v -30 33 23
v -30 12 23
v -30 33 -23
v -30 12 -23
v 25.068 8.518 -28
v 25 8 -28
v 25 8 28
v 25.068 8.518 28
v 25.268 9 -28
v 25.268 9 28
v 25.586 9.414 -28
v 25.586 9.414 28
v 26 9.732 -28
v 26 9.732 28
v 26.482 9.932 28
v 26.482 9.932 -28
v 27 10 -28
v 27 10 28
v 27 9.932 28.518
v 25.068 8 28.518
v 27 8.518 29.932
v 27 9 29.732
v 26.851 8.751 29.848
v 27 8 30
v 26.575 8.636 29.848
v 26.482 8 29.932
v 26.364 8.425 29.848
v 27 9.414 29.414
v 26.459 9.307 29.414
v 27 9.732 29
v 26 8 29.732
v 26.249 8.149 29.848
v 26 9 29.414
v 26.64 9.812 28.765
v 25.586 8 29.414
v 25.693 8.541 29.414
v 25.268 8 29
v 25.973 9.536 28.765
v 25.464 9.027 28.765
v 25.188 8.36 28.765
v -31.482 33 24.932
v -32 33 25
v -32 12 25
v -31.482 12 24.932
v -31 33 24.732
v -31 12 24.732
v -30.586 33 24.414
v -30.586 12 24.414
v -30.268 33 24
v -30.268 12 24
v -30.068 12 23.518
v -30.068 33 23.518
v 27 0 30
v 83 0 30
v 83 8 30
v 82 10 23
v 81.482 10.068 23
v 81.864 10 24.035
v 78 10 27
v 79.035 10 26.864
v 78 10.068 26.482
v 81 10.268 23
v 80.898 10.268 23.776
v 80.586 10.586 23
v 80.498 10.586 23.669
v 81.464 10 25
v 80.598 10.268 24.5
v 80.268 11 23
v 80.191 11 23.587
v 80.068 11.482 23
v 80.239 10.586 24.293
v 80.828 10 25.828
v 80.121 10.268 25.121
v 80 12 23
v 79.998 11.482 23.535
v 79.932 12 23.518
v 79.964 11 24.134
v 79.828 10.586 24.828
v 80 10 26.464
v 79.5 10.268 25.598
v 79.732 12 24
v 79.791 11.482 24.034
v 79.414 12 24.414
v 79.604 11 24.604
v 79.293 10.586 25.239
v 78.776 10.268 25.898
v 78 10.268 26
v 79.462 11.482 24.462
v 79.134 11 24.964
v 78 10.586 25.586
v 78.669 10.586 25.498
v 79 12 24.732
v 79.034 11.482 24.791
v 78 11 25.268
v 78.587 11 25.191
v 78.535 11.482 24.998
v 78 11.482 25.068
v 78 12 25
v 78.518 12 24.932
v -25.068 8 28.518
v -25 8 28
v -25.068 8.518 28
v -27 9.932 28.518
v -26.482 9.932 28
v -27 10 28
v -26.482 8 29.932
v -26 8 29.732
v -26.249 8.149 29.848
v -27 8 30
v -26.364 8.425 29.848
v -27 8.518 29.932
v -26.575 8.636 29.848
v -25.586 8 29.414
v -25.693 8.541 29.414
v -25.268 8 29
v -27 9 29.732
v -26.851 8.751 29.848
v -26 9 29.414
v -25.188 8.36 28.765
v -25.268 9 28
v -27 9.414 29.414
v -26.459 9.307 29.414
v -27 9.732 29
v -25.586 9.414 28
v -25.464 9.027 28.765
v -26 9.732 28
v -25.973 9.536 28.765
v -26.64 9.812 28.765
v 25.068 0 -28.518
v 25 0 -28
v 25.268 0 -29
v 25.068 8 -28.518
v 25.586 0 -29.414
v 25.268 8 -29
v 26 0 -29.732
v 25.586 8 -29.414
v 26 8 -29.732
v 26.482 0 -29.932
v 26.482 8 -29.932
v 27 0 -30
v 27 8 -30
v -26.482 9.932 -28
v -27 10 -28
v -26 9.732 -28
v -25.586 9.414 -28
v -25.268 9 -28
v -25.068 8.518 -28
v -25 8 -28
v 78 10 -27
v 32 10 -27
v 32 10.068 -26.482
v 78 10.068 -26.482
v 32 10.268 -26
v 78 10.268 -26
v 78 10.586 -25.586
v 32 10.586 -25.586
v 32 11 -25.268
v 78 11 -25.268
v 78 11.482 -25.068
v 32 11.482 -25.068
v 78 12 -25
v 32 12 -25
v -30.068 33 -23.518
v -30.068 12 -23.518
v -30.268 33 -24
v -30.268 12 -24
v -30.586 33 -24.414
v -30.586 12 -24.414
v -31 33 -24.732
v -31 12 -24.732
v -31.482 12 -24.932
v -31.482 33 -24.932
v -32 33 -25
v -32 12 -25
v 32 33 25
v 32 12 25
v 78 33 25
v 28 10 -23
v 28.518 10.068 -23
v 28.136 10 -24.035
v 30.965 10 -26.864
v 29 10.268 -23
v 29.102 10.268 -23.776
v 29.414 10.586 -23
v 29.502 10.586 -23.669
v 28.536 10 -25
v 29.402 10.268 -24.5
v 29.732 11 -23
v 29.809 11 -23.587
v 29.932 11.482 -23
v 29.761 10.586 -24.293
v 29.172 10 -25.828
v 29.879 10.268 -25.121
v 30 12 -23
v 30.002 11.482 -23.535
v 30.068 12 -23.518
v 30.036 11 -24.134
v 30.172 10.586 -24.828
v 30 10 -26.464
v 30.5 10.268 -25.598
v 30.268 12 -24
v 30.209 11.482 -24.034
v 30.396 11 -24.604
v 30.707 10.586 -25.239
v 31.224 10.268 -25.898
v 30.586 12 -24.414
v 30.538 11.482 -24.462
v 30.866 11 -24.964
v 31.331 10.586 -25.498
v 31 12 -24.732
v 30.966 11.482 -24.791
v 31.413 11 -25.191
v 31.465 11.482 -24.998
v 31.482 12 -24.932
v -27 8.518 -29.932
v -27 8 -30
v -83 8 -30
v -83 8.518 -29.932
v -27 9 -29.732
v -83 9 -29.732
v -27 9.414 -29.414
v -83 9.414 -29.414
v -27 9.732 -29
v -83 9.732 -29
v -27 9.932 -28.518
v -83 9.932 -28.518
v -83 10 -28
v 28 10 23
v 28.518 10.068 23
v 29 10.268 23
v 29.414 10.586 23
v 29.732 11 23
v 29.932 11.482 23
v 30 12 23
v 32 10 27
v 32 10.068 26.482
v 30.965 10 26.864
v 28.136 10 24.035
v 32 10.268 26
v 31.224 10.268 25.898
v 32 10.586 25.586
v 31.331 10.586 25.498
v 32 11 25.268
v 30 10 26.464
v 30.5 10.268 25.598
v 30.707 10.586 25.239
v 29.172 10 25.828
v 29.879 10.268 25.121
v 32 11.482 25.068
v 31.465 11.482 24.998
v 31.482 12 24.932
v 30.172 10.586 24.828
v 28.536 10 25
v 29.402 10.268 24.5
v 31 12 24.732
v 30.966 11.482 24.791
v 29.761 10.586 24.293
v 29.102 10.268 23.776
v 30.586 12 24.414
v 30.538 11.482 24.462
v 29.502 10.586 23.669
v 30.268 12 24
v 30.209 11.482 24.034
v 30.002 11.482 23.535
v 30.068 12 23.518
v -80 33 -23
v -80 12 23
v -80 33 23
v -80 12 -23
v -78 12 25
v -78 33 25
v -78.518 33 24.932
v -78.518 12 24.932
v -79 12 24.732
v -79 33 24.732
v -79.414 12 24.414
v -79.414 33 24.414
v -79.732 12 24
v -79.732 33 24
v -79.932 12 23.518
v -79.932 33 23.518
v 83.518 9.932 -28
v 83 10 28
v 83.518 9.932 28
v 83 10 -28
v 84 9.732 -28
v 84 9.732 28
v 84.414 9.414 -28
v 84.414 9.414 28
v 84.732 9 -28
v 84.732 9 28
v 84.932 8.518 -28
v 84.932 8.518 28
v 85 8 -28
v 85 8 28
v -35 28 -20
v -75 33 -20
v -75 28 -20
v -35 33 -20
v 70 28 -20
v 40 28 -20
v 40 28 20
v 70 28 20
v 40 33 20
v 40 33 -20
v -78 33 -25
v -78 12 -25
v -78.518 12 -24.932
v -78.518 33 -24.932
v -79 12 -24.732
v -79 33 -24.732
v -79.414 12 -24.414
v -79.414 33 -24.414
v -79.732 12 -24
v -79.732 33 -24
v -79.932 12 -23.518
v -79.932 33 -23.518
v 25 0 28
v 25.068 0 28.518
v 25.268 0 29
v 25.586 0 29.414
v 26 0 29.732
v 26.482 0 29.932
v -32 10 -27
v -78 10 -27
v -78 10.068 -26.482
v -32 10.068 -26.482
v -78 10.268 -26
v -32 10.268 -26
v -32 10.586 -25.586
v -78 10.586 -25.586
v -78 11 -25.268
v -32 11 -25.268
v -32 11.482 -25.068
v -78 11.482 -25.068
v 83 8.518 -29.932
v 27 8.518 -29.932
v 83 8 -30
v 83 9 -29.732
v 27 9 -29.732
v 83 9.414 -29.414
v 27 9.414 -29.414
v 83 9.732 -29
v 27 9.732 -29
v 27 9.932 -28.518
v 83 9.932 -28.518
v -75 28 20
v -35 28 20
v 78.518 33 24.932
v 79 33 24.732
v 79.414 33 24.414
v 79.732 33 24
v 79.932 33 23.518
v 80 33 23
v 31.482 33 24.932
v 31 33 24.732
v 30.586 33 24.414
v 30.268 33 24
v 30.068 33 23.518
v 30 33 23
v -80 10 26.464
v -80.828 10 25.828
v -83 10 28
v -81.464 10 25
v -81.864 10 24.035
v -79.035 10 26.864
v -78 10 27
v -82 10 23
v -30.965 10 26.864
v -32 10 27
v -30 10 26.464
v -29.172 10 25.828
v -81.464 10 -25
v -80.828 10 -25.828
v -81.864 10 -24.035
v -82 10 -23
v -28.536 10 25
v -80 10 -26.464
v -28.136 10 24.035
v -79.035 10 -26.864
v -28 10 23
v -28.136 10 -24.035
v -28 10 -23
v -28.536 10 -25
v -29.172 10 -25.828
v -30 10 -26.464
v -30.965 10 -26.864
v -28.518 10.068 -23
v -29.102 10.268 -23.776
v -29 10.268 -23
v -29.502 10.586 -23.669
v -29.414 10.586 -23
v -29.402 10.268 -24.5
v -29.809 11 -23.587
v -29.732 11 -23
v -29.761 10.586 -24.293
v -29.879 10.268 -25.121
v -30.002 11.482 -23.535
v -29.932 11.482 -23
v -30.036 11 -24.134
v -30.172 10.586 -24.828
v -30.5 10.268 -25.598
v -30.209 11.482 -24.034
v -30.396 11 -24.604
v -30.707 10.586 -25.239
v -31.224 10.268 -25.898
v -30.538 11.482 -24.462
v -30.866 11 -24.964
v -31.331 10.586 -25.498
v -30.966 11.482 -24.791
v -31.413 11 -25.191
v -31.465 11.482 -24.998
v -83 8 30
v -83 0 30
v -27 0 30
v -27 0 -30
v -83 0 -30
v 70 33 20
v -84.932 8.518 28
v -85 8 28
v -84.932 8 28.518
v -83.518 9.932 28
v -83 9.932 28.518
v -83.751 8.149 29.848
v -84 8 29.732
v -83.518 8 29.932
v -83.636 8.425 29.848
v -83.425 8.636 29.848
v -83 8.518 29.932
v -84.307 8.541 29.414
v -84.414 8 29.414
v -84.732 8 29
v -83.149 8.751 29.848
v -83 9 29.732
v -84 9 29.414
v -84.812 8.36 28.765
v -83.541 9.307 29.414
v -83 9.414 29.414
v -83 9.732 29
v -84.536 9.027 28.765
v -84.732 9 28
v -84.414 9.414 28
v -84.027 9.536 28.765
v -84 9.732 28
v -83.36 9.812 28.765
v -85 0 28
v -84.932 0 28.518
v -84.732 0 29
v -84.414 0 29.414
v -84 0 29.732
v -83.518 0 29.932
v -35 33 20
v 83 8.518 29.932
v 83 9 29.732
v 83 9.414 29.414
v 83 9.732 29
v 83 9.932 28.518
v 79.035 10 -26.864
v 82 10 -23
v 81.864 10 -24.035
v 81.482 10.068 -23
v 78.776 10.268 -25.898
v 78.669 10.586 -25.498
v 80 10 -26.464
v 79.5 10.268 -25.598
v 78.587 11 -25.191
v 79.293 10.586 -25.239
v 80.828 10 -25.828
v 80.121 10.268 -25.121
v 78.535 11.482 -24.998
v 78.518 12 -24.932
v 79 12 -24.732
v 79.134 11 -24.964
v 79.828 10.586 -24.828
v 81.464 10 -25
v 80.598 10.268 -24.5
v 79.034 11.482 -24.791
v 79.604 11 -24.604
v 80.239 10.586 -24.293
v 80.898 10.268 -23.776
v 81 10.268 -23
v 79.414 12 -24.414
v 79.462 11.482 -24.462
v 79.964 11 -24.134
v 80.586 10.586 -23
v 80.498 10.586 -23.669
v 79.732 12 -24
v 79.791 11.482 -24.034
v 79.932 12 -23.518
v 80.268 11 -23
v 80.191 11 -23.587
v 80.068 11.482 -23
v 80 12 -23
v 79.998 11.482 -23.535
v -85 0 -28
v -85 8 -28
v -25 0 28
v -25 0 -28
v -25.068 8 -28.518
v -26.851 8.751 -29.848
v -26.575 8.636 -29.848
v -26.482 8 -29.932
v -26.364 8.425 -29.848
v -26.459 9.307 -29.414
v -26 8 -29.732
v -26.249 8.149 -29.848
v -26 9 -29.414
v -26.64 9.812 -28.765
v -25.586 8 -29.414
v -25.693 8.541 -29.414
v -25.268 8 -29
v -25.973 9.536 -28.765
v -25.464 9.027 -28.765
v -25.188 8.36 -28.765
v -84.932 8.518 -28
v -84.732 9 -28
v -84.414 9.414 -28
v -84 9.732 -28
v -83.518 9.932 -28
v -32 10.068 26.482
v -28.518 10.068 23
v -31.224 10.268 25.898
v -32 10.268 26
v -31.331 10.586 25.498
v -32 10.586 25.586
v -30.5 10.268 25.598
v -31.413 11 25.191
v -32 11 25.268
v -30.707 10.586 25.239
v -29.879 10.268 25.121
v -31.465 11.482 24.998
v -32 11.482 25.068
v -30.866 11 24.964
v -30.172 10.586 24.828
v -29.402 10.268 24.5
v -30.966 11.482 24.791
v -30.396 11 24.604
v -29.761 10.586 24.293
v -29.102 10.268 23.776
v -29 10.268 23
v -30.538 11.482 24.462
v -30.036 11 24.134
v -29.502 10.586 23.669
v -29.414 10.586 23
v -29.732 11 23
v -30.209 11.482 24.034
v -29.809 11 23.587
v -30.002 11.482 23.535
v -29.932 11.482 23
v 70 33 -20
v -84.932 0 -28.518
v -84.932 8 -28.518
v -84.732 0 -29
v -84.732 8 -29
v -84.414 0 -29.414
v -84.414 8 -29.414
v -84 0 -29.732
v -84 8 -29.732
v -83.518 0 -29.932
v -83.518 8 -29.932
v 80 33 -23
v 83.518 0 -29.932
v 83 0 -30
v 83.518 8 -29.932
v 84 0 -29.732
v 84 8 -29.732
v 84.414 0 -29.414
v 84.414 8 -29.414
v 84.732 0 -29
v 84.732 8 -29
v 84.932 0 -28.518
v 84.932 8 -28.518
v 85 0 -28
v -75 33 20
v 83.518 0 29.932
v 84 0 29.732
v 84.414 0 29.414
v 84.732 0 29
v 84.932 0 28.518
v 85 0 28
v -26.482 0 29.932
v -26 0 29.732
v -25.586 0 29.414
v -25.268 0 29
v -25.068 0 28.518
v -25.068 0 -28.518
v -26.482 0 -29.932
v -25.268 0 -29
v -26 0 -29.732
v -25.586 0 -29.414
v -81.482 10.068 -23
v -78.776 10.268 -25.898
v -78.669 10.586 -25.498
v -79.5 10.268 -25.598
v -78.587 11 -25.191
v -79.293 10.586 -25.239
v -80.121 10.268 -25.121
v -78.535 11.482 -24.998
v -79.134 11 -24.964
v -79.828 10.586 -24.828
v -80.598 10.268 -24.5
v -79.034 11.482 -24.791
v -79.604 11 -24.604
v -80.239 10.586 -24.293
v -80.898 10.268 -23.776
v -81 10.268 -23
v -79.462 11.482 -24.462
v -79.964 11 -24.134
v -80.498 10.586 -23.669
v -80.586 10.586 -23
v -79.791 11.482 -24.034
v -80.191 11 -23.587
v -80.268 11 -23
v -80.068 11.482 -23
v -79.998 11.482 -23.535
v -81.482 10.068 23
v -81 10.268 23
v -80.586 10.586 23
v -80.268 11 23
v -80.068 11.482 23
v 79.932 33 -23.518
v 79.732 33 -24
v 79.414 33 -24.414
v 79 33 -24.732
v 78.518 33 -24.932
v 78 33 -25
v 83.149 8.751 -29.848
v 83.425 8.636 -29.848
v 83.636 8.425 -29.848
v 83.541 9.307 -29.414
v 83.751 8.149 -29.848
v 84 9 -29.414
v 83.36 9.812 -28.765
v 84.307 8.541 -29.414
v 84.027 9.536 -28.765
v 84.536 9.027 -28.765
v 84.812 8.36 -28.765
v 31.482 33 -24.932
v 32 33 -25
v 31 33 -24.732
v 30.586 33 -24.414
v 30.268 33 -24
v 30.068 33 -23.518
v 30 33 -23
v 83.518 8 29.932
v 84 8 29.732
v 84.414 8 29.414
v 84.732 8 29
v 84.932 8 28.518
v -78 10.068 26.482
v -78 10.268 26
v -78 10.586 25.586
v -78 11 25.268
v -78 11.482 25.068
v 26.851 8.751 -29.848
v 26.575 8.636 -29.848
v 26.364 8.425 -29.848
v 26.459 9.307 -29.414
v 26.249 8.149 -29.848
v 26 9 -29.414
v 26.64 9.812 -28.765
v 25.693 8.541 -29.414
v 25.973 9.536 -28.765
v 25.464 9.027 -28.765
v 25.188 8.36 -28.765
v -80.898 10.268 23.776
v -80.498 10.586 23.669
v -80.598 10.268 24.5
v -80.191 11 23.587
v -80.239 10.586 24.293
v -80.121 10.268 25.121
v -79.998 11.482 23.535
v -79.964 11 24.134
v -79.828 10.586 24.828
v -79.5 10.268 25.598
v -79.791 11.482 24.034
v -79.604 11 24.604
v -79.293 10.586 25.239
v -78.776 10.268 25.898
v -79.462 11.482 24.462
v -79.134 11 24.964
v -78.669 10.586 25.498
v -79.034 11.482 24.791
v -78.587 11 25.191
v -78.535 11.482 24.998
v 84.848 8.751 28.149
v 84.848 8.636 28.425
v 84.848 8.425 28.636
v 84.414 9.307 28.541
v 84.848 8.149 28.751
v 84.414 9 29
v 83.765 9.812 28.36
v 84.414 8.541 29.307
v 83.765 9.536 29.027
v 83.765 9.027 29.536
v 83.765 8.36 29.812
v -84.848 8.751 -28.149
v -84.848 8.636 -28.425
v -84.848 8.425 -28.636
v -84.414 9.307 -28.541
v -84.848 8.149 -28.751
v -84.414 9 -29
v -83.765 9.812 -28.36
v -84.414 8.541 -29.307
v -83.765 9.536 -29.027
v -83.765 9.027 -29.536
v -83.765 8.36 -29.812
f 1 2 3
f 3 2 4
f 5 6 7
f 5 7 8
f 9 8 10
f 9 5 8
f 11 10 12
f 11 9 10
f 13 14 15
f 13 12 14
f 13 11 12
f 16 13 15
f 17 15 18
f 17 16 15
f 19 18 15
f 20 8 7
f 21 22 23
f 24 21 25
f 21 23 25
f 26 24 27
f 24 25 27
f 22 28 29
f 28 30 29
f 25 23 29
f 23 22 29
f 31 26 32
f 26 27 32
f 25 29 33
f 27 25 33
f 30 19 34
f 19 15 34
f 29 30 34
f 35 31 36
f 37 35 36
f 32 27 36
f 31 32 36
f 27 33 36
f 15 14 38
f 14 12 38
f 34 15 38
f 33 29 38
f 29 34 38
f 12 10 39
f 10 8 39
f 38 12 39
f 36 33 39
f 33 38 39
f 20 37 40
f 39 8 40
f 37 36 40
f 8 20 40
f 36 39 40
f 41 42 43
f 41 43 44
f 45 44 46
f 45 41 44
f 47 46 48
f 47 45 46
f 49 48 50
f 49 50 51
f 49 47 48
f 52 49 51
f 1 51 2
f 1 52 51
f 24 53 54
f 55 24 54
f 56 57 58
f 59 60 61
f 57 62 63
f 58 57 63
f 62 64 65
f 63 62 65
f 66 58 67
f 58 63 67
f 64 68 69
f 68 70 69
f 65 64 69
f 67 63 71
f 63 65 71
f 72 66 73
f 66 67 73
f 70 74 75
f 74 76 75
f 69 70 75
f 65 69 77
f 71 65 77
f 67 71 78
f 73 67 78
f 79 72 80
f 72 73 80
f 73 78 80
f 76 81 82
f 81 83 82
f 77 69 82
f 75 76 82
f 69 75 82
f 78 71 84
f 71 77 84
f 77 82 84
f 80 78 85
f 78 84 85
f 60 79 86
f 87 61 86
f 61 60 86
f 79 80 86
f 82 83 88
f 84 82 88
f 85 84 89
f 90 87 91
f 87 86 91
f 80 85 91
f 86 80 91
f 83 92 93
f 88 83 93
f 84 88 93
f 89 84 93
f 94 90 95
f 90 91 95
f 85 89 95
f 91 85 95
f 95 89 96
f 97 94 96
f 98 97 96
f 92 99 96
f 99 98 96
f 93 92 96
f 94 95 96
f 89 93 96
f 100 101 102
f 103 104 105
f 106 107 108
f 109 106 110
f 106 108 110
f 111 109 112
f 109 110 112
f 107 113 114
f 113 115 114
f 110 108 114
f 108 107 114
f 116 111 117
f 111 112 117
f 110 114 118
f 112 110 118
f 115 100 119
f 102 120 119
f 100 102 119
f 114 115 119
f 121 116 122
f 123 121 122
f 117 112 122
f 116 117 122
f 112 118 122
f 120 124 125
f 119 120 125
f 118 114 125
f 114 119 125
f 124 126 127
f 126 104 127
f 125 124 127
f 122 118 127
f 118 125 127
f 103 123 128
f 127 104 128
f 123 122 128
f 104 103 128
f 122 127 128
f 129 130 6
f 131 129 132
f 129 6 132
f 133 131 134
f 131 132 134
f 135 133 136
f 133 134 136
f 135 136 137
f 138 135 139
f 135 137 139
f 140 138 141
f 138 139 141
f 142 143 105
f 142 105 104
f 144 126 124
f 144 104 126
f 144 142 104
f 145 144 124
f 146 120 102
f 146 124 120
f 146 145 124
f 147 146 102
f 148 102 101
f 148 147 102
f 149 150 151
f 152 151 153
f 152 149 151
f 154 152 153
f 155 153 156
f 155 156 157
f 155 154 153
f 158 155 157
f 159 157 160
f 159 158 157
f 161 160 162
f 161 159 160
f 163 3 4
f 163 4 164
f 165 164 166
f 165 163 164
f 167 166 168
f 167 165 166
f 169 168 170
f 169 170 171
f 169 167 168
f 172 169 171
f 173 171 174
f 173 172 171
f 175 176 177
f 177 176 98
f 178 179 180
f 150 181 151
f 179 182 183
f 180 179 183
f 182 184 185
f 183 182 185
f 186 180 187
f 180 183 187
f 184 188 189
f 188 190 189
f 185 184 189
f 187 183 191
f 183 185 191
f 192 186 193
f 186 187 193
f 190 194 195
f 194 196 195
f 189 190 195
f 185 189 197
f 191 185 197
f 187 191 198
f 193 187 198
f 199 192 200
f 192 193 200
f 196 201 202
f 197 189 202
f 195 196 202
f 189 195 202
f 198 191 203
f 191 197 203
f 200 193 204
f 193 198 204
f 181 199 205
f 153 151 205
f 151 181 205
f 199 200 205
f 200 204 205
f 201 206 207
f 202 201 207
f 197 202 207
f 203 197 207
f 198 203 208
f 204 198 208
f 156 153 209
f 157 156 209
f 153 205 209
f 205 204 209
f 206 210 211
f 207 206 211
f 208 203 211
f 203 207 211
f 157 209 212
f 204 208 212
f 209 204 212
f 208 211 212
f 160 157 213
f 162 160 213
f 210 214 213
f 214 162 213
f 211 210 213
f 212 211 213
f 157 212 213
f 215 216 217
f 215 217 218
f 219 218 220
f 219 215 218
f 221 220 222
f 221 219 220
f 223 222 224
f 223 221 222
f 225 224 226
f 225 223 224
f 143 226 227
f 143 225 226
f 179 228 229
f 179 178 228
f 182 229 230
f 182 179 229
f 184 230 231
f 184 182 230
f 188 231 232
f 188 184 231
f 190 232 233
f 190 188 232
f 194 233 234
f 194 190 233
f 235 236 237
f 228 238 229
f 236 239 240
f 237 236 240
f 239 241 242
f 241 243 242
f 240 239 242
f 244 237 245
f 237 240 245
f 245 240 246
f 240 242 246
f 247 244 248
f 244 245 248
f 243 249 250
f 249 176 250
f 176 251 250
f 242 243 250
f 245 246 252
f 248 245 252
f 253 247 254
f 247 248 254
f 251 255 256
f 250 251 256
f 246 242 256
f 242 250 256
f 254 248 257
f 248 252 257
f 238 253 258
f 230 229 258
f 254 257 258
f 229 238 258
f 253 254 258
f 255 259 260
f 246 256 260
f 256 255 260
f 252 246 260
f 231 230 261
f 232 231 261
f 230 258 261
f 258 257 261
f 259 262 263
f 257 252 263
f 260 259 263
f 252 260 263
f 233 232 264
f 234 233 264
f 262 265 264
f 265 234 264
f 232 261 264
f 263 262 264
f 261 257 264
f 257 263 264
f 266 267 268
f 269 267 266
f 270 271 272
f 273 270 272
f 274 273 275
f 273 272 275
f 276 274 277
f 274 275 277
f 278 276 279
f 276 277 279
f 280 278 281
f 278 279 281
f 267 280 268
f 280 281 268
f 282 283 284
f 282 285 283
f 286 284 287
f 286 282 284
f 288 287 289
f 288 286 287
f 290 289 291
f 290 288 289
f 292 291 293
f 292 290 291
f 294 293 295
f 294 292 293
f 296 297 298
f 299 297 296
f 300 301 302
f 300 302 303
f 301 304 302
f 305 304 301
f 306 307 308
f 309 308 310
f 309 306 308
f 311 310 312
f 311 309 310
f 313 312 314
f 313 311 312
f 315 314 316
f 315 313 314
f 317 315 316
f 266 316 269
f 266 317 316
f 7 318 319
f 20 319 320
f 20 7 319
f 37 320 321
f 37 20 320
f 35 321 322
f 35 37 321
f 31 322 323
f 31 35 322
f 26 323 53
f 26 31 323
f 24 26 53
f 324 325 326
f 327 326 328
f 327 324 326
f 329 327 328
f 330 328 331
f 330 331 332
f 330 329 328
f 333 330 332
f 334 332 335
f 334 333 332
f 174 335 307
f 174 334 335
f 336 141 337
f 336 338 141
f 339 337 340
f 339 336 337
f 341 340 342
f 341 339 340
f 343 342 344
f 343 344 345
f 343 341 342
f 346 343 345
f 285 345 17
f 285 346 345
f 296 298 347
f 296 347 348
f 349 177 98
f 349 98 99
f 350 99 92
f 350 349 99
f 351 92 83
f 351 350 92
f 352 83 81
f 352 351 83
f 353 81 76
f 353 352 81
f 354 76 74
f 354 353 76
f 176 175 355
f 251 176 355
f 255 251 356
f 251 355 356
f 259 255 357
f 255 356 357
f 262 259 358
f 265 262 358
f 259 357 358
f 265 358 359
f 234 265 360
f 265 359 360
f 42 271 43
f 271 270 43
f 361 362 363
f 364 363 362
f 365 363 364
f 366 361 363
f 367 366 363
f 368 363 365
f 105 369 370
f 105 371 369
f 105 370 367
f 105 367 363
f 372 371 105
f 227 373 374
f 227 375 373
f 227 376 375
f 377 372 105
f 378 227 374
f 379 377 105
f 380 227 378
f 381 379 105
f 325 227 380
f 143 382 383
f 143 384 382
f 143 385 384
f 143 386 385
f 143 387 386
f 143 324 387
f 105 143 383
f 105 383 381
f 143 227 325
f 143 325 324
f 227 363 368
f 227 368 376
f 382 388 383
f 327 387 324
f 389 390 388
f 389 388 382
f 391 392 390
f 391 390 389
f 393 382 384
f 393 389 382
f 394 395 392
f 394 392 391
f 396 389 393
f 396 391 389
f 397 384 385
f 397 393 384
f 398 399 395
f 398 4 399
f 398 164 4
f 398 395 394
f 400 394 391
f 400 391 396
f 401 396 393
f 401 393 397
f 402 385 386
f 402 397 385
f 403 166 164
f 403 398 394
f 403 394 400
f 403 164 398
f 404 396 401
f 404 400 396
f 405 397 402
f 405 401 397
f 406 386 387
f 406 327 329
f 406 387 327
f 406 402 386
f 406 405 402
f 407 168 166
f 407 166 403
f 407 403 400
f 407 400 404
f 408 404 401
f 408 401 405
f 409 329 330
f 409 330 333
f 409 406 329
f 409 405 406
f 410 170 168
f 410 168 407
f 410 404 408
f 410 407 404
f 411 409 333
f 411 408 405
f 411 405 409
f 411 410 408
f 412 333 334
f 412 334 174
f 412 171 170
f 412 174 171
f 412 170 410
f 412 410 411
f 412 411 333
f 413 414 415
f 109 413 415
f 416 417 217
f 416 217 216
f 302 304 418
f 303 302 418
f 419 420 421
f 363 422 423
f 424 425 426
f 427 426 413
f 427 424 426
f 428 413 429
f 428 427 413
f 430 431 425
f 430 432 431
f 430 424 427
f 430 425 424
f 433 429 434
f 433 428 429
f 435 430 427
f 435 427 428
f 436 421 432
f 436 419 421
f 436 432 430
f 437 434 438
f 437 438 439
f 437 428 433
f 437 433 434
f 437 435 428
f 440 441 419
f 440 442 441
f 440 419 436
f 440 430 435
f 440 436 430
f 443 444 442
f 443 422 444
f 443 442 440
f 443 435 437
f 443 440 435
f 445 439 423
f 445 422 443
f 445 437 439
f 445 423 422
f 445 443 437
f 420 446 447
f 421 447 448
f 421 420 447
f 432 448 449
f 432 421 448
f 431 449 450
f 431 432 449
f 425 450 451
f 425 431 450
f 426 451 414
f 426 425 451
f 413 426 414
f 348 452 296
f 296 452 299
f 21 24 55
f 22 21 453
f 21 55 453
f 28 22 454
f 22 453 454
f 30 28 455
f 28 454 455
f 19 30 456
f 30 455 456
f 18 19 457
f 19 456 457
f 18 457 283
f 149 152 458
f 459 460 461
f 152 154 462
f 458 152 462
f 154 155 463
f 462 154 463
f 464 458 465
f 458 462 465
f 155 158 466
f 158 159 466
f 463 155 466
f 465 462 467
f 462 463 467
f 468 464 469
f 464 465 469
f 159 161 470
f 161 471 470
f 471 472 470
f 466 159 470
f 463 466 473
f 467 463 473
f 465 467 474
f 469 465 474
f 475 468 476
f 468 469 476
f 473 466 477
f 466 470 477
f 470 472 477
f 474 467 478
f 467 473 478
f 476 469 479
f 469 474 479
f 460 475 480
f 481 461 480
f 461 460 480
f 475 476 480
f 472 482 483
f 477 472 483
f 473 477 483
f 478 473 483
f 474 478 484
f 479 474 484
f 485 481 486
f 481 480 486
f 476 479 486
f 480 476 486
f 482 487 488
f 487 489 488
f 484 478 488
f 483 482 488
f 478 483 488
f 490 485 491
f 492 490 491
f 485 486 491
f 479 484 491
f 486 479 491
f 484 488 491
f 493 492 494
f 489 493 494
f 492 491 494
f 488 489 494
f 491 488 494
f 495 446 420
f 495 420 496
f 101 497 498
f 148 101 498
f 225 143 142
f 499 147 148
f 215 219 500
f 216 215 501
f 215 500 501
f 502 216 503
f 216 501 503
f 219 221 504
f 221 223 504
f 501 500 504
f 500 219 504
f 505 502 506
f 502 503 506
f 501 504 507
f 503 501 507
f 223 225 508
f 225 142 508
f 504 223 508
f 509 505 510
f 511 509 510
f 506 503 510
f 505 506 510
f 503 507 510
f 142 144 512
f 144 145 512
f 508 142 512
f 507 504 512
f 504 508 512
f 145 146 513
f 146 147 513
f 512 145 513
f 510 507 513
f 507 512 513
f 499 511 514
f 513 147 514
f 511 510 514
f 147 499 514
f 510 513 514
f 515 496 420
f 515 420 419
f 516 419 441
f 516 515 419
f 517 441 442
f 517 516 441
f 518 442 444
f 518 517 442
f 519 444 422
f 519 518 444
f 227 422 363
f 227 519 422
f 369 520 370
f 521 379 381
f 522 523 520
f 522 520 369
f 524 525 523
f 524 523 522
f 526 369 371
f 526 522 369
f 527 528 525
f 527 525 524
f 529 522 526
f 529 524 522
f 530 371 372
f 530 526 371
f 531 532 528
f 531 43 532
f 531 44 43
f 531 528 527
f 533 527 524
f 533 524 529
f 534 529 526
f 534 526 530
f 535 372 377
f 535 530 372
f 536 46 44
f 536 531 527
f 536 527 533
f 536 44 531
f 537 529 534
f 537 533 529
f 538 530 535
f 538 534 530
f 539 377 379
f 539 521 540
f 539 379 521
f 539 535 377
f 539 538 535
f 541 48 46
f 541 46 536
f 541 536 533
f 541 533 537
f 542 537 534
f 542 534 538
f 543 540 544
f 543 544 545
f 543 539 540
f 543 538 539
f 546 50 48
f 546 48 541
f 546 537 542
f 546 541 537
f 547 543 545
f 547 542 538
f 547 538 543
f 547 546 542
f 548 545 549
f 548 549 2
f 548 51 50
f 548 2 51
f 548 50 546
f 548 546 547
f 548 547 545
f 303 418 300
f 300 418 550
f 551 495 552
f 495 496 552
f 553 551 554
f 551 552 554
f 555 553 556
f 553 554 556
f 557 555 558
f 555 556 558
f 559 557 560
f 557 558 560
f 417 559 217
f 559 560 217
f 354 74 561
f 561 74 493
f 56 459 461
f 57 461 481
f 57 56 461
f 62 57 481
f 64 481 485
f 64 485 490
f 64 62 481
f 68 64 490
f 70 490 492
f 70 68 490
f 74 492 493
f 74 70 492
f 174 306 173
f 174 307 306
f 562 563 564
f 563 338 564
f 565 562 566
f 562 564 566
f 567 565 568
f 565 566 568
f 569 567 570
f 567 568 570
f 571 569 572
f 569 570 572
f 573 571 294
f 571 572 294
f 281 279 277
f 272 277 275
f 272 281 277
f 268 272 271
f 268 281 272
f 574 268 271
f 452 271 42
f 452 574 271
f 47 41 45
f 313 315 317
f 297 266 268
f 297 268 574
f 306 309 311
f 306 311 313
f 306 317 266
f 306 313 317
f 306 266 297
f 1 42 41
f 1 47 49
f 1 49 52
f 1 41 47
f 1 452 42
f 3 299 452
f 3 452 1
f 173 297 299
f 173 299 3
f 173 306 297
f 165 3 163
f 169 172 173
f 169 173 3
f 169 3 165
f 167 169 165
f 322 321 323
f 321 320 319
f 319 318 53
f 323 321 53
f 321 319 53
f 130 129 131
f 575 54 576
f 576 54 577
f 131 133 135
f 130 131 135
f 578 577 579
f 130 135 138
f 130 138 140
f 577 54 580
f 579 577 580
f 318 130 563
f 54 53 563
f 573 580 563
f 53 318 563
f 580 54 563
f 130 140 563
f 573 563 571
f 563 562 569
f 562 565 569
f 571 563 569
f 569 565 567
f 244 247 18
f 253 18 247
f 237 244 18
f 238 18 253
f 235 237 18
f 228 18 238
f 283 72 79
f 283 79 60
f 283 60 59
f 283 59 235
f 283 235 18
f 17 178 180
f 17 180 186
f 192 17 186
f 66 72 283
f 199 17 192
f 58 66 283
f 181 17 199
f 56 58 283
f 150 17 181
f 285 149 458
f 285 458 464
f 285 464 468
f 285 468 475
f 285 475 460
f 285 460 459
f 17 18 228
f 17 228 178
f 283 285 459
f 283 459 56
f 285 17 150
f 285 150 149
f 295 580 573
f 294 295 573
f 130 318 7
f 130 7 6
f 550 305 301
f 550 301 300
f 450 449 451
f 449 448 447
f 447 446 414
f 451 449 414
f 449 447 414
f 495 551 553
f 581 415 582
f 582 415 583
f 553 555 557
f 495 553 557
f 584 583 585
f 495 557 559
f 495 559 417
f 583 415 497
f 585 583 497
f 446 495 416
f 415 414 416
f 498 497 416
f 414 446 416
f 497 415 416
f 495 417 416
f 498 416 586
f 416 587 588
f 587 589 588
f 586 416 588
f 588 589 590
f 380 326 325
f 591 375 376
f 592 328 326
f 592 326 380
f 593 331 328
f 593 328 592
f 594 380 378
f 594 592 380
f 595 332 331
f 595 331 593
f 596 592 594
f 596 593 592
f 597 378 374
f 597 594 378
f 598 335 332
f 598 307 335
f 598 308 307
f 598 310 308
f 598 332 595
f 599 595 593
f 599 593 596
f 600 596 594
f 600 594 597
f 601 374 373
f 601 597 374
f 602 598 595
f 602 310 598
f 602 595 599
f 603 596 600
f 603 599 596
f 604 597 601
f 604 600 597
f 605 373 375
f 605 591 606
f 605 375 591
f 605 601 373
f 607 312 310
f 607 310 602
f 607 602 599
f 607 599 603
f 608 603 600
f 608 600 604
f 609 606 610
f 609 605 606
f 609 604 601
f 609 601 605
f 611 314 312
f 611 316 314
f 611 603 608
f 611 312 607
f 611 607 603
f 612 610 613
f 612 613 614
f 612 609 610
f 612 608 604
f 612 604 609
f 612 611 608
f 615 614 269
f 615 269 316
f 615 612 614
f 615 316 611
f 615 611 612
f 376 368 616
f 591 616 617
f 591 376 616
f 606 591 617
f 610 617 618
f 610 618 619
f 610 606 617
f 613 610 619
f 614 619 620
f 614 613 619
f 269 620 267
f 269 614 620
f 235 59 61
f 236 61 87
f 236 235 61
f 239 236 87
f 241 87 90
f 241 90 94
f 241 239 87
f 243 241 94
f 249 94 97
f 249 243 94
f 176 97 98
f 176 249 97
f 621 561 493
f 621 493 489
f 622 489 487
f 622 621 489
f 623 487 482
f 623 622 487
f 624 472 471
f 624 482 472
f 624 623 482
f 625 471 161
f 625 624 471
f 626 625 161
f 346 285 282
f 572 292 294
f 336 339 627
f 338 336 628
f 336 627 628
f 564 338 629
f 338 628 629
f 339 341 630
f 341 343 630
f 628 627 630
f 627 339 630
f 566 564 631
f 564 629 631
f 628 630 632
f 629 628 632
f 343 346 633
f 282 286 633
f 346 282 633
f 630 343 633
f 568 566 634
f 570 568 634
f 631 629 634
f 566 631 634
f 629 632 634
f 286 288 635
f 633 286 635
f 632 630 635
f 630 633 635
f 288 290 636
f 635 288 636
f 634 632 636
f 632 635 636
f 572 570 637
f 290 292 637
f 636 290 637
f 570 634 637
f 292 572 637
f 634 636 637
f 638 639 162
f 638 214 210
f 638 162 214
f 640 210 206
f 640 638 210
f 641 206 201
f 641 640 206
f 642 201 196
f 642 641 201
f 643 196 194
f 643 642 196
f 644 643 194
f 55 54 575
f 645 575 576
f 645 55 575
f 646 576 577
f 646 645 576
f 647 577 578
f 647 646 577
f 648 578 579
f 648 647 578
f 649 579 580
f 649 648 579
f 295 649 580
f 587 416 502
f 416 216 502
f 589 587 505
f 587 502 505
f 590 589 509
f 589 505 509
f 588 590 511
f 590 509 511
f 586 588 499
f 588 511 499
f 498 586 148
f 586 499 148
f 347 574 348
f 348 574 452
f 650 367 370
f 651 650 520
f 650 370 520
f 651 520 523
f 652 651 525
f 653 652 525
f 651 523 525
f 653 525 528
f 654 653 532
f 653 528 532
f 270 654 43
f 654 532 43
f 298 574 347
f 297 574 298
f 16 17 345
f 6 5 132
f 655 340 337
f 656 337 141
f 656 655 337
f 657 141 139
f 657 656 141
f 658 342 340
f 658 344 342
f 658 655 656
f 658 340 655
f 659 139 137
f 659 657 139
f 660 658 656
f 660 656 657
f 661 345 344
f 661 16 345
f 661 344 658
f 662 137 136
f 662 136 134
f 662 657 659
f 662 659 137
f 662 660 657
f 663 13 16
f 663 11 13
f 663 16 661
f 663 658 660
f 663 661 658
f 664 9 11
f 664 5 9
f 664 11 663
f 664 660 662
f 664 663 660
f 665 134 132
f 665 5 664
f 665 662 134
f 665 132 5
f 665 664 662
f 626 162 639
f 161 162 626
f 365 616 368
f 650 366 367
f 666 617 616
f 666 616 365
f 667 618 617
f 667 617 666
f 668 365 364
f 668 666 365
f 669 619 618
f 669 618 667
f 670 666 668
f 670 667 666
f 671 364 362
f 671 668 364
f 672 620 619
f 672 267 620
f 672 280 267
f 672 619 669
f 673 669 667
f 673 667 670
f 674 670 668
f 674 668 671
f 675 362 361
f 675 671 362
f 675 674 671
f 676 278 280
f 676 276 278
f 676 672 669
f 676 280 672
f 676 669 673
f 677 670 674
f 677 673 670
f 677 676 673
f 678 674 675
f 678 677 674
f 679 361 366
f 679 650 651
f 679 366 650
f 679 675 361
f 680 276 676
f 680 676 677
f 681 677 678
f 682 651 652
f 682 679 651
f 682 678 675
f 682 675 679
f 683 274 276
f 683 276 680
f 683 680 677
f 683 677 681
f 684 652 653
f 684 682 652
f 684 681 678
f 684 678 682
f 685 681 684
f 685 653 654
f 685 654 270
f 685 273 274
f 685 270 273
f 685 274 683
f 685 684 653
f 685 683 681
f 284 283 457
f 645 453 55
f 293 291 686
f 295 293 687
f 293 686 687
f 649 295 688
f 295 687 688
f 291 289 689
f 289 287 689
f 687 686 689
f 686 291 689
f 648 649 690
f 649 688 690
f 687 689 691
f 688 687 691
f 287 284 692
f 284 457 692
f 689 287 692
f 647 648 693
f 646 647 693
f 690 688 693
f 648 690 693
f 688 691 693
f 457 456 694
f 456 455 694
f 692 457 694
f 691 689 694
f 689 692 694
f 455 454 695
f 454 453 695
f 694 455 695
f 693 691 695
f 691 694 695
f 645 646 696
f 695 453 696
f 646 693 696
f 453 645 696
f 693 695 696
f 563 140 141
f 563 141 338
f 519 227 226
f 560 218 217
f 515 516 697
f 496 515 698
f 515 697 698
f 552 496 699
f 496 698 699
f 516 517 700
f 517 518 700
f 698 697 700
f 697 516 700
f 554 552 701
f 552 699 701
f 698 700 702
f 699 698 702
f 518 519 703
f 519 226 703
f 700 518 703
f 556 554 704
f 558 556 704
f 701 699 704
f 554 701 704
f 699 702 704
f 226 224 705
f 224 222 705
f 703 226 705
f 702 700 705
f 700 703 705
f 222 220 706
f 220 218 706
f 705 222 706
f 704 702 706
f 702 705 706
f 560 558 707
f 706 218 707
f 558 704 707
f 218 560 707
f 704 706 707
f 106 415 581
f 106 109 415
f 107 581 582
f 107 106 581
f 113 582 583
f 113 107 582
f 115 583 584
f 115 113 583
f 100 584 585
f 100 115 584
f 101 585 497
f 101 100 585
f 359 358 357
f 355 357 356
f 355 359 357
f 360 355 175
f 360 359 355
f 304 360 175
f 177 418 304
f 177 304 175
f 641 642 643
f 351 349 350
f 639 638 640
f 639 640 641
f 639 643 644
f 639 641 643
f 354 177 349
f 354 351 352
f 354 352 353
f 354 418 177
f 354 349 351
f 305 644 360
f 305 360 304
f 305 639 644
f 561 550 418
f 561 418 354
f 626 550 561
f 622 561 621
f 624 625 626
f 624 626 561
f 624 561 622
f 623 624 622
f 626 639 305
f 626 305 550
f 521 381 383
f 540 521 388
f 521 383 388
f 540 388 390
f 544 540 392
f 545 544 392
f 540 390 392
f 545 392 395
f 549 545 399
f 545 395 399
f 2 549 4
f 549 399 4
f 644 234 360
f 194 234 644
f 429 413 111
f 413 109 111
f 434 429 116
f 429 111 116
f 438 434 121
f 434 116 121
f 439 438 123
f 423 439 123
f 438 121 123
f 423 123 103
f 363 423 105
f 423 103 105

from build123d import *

# Parameters (mm, degrees)
SKETCH_1_W          = 60
SKETCH_1_H          = 60
EXTRUDE_1_DEPTH     = 10
EXTRUDE_1_2_DEPTH   = 10
SKETCH_4_W          = 50
SKETCH_4_H          = 50
EXTRUDE_3_DEPTH     = 23
FILLET_6_R          = 2
FILLET_7_R          = 2
SKETCH_5_W          = 40
SKETCH_5_H          = 40
CUT_EXTRUDE_1_DEPTH = 5
SKETCH_6_W          = 30
SKETCH_6_H          = 40
CUT_EXTRUDE_2_DEPTH = 5
FILLET_8_R          = 2


with BuildPart() as part:
    # 스케치1 → 보스-돌출1 (new body)
    with BuildSketch(Plane(origin=(0, 0, 0), x_dir=(1, 0, 0), z_dir=(0, 1, 0))):
        with Locations((-55, 0)):
            Rectangle(SKETCH_1_W, SKETCH_1_H)
    extrude(amount=EXTRUDE_1_DEPTH)



with BuildPart() as body_2:
    # 스케치1 → Extrude 1 2 (new body)
    with BuildSketch(Plane(origin=(0, 0, 0), x_dir=(1, 0, 0), z_dir=(0, 1, 0))):
        with Locations((55, 0)):
            Rectangle(SKETCH_1_W, SKETCH_1_H)
    extrude(amount=EXTRUDE_1_2_DEPTH)


with BuildPart() as part_1:
    add(part.part)

    add(body_2.part)  # 보스-돌출3 merges body 2
    # 스케치4 → 보스-돌출3 (add)
    with BuildSketch(Plane(origin=(0, 10, 0), x_dir=(1, 0, 0), z_dir=(0, 1, 0))):
        with Locations((-55, 0)):
            Rectangle(SKETCH_4_W, SKETCH_4_H)
        with Locations((55, 0)):
            Rectangle(SKETCH_4_W, SKETCH_4_H)
    extrude(amount=EXTRUDE_3_DEPTH)

    # 필렛6
    fillet_6_edges = [part_1.edges().sort_by_distance(p)[0] for p in [
        (-25, 10, 0),
        (-55, 10, -30),
        (-80, 10, 0),
        (-80, 21.5, -25),
        (-55, 10, 25),
        (-80, 21.5, 25),
        (-30, 10, 0),
        (-30, 21.5, 25),
        (-55, 10, -25),
        (-30, 21.5, -25),
        (-85, 10, 0),
        (-85, 5, -30),
        (-25, 5, -30),
        (-25, 5, 30),
        (-85, 5, 30),
        (-55, 10, 30),
    ]]
    fillet(fillet_6_edges, radius=FILLET_6_R)

    # 필렛7
    fillet_7_edges = [part_1.edges().sort_by_distance(p)[0] for p in [
        (30, 21.5, -25),
        (30, 21.5, 25),
        (80, 21.5, 25),
        (80, 21.5, -25),
        (25, 10, 0),
        (55, 10, 30),
        (85, 10, 0),
        (55, 10, -30),
        (25, 5, -30),
        (85, 5, -30),
        (85, 5, 30),
        (25, 5, 30),
    ]]
    fillet(fillet_7_edges, radius=FILLET_7_R)

    # 스케치5 → 컷-돌출1 (cut)
    with BuildSketch(Plane(origin=(0, 33, 0), x_dir=(1, 0, 0), z_dir=(0, 1, 0))):
        with Locations((-55, 0)):
            Rectangle(SKETCH_5_W, SKETCH_5_H)
    extrude(amount=-CUT_EXTRUDE_1_DEPTH, mode=Mode.SUBTRACT)

    # 스케치6 → 컷-돌출2 (cut)
    with BuildSketch(Plane(origin=(0, 33, 0), x_dir=(1, 0, 0), z_dir=(0, 1, 0))):
        with Locations((55, 0)):
            Rectangle(SKETCH_6_W, SKETCH_6_H)
    extrude(amount=-CUT_EXTRUDE_2_DEPTH, mode=Mode.SUBTRACT)

    # 필렛8
    fillet_8_edges = [part_1.edges().sort_by_distance(p)[0] for p in [
        (30, 10, 0),
        (55, 10, -25),
        (80, 10, 0),
        (55, 10, 25),
        (30.585786438, 10, 24.414213562),
        (30.585786438, 10, -24.414213562),
        (79.414213562, 10, -24.414213562),
        (79.414213562, 10, 24.414213562),
    ]]
    fillet(fillet_8_edges, radius=FILLET_8_R)


solid = part_1.part
